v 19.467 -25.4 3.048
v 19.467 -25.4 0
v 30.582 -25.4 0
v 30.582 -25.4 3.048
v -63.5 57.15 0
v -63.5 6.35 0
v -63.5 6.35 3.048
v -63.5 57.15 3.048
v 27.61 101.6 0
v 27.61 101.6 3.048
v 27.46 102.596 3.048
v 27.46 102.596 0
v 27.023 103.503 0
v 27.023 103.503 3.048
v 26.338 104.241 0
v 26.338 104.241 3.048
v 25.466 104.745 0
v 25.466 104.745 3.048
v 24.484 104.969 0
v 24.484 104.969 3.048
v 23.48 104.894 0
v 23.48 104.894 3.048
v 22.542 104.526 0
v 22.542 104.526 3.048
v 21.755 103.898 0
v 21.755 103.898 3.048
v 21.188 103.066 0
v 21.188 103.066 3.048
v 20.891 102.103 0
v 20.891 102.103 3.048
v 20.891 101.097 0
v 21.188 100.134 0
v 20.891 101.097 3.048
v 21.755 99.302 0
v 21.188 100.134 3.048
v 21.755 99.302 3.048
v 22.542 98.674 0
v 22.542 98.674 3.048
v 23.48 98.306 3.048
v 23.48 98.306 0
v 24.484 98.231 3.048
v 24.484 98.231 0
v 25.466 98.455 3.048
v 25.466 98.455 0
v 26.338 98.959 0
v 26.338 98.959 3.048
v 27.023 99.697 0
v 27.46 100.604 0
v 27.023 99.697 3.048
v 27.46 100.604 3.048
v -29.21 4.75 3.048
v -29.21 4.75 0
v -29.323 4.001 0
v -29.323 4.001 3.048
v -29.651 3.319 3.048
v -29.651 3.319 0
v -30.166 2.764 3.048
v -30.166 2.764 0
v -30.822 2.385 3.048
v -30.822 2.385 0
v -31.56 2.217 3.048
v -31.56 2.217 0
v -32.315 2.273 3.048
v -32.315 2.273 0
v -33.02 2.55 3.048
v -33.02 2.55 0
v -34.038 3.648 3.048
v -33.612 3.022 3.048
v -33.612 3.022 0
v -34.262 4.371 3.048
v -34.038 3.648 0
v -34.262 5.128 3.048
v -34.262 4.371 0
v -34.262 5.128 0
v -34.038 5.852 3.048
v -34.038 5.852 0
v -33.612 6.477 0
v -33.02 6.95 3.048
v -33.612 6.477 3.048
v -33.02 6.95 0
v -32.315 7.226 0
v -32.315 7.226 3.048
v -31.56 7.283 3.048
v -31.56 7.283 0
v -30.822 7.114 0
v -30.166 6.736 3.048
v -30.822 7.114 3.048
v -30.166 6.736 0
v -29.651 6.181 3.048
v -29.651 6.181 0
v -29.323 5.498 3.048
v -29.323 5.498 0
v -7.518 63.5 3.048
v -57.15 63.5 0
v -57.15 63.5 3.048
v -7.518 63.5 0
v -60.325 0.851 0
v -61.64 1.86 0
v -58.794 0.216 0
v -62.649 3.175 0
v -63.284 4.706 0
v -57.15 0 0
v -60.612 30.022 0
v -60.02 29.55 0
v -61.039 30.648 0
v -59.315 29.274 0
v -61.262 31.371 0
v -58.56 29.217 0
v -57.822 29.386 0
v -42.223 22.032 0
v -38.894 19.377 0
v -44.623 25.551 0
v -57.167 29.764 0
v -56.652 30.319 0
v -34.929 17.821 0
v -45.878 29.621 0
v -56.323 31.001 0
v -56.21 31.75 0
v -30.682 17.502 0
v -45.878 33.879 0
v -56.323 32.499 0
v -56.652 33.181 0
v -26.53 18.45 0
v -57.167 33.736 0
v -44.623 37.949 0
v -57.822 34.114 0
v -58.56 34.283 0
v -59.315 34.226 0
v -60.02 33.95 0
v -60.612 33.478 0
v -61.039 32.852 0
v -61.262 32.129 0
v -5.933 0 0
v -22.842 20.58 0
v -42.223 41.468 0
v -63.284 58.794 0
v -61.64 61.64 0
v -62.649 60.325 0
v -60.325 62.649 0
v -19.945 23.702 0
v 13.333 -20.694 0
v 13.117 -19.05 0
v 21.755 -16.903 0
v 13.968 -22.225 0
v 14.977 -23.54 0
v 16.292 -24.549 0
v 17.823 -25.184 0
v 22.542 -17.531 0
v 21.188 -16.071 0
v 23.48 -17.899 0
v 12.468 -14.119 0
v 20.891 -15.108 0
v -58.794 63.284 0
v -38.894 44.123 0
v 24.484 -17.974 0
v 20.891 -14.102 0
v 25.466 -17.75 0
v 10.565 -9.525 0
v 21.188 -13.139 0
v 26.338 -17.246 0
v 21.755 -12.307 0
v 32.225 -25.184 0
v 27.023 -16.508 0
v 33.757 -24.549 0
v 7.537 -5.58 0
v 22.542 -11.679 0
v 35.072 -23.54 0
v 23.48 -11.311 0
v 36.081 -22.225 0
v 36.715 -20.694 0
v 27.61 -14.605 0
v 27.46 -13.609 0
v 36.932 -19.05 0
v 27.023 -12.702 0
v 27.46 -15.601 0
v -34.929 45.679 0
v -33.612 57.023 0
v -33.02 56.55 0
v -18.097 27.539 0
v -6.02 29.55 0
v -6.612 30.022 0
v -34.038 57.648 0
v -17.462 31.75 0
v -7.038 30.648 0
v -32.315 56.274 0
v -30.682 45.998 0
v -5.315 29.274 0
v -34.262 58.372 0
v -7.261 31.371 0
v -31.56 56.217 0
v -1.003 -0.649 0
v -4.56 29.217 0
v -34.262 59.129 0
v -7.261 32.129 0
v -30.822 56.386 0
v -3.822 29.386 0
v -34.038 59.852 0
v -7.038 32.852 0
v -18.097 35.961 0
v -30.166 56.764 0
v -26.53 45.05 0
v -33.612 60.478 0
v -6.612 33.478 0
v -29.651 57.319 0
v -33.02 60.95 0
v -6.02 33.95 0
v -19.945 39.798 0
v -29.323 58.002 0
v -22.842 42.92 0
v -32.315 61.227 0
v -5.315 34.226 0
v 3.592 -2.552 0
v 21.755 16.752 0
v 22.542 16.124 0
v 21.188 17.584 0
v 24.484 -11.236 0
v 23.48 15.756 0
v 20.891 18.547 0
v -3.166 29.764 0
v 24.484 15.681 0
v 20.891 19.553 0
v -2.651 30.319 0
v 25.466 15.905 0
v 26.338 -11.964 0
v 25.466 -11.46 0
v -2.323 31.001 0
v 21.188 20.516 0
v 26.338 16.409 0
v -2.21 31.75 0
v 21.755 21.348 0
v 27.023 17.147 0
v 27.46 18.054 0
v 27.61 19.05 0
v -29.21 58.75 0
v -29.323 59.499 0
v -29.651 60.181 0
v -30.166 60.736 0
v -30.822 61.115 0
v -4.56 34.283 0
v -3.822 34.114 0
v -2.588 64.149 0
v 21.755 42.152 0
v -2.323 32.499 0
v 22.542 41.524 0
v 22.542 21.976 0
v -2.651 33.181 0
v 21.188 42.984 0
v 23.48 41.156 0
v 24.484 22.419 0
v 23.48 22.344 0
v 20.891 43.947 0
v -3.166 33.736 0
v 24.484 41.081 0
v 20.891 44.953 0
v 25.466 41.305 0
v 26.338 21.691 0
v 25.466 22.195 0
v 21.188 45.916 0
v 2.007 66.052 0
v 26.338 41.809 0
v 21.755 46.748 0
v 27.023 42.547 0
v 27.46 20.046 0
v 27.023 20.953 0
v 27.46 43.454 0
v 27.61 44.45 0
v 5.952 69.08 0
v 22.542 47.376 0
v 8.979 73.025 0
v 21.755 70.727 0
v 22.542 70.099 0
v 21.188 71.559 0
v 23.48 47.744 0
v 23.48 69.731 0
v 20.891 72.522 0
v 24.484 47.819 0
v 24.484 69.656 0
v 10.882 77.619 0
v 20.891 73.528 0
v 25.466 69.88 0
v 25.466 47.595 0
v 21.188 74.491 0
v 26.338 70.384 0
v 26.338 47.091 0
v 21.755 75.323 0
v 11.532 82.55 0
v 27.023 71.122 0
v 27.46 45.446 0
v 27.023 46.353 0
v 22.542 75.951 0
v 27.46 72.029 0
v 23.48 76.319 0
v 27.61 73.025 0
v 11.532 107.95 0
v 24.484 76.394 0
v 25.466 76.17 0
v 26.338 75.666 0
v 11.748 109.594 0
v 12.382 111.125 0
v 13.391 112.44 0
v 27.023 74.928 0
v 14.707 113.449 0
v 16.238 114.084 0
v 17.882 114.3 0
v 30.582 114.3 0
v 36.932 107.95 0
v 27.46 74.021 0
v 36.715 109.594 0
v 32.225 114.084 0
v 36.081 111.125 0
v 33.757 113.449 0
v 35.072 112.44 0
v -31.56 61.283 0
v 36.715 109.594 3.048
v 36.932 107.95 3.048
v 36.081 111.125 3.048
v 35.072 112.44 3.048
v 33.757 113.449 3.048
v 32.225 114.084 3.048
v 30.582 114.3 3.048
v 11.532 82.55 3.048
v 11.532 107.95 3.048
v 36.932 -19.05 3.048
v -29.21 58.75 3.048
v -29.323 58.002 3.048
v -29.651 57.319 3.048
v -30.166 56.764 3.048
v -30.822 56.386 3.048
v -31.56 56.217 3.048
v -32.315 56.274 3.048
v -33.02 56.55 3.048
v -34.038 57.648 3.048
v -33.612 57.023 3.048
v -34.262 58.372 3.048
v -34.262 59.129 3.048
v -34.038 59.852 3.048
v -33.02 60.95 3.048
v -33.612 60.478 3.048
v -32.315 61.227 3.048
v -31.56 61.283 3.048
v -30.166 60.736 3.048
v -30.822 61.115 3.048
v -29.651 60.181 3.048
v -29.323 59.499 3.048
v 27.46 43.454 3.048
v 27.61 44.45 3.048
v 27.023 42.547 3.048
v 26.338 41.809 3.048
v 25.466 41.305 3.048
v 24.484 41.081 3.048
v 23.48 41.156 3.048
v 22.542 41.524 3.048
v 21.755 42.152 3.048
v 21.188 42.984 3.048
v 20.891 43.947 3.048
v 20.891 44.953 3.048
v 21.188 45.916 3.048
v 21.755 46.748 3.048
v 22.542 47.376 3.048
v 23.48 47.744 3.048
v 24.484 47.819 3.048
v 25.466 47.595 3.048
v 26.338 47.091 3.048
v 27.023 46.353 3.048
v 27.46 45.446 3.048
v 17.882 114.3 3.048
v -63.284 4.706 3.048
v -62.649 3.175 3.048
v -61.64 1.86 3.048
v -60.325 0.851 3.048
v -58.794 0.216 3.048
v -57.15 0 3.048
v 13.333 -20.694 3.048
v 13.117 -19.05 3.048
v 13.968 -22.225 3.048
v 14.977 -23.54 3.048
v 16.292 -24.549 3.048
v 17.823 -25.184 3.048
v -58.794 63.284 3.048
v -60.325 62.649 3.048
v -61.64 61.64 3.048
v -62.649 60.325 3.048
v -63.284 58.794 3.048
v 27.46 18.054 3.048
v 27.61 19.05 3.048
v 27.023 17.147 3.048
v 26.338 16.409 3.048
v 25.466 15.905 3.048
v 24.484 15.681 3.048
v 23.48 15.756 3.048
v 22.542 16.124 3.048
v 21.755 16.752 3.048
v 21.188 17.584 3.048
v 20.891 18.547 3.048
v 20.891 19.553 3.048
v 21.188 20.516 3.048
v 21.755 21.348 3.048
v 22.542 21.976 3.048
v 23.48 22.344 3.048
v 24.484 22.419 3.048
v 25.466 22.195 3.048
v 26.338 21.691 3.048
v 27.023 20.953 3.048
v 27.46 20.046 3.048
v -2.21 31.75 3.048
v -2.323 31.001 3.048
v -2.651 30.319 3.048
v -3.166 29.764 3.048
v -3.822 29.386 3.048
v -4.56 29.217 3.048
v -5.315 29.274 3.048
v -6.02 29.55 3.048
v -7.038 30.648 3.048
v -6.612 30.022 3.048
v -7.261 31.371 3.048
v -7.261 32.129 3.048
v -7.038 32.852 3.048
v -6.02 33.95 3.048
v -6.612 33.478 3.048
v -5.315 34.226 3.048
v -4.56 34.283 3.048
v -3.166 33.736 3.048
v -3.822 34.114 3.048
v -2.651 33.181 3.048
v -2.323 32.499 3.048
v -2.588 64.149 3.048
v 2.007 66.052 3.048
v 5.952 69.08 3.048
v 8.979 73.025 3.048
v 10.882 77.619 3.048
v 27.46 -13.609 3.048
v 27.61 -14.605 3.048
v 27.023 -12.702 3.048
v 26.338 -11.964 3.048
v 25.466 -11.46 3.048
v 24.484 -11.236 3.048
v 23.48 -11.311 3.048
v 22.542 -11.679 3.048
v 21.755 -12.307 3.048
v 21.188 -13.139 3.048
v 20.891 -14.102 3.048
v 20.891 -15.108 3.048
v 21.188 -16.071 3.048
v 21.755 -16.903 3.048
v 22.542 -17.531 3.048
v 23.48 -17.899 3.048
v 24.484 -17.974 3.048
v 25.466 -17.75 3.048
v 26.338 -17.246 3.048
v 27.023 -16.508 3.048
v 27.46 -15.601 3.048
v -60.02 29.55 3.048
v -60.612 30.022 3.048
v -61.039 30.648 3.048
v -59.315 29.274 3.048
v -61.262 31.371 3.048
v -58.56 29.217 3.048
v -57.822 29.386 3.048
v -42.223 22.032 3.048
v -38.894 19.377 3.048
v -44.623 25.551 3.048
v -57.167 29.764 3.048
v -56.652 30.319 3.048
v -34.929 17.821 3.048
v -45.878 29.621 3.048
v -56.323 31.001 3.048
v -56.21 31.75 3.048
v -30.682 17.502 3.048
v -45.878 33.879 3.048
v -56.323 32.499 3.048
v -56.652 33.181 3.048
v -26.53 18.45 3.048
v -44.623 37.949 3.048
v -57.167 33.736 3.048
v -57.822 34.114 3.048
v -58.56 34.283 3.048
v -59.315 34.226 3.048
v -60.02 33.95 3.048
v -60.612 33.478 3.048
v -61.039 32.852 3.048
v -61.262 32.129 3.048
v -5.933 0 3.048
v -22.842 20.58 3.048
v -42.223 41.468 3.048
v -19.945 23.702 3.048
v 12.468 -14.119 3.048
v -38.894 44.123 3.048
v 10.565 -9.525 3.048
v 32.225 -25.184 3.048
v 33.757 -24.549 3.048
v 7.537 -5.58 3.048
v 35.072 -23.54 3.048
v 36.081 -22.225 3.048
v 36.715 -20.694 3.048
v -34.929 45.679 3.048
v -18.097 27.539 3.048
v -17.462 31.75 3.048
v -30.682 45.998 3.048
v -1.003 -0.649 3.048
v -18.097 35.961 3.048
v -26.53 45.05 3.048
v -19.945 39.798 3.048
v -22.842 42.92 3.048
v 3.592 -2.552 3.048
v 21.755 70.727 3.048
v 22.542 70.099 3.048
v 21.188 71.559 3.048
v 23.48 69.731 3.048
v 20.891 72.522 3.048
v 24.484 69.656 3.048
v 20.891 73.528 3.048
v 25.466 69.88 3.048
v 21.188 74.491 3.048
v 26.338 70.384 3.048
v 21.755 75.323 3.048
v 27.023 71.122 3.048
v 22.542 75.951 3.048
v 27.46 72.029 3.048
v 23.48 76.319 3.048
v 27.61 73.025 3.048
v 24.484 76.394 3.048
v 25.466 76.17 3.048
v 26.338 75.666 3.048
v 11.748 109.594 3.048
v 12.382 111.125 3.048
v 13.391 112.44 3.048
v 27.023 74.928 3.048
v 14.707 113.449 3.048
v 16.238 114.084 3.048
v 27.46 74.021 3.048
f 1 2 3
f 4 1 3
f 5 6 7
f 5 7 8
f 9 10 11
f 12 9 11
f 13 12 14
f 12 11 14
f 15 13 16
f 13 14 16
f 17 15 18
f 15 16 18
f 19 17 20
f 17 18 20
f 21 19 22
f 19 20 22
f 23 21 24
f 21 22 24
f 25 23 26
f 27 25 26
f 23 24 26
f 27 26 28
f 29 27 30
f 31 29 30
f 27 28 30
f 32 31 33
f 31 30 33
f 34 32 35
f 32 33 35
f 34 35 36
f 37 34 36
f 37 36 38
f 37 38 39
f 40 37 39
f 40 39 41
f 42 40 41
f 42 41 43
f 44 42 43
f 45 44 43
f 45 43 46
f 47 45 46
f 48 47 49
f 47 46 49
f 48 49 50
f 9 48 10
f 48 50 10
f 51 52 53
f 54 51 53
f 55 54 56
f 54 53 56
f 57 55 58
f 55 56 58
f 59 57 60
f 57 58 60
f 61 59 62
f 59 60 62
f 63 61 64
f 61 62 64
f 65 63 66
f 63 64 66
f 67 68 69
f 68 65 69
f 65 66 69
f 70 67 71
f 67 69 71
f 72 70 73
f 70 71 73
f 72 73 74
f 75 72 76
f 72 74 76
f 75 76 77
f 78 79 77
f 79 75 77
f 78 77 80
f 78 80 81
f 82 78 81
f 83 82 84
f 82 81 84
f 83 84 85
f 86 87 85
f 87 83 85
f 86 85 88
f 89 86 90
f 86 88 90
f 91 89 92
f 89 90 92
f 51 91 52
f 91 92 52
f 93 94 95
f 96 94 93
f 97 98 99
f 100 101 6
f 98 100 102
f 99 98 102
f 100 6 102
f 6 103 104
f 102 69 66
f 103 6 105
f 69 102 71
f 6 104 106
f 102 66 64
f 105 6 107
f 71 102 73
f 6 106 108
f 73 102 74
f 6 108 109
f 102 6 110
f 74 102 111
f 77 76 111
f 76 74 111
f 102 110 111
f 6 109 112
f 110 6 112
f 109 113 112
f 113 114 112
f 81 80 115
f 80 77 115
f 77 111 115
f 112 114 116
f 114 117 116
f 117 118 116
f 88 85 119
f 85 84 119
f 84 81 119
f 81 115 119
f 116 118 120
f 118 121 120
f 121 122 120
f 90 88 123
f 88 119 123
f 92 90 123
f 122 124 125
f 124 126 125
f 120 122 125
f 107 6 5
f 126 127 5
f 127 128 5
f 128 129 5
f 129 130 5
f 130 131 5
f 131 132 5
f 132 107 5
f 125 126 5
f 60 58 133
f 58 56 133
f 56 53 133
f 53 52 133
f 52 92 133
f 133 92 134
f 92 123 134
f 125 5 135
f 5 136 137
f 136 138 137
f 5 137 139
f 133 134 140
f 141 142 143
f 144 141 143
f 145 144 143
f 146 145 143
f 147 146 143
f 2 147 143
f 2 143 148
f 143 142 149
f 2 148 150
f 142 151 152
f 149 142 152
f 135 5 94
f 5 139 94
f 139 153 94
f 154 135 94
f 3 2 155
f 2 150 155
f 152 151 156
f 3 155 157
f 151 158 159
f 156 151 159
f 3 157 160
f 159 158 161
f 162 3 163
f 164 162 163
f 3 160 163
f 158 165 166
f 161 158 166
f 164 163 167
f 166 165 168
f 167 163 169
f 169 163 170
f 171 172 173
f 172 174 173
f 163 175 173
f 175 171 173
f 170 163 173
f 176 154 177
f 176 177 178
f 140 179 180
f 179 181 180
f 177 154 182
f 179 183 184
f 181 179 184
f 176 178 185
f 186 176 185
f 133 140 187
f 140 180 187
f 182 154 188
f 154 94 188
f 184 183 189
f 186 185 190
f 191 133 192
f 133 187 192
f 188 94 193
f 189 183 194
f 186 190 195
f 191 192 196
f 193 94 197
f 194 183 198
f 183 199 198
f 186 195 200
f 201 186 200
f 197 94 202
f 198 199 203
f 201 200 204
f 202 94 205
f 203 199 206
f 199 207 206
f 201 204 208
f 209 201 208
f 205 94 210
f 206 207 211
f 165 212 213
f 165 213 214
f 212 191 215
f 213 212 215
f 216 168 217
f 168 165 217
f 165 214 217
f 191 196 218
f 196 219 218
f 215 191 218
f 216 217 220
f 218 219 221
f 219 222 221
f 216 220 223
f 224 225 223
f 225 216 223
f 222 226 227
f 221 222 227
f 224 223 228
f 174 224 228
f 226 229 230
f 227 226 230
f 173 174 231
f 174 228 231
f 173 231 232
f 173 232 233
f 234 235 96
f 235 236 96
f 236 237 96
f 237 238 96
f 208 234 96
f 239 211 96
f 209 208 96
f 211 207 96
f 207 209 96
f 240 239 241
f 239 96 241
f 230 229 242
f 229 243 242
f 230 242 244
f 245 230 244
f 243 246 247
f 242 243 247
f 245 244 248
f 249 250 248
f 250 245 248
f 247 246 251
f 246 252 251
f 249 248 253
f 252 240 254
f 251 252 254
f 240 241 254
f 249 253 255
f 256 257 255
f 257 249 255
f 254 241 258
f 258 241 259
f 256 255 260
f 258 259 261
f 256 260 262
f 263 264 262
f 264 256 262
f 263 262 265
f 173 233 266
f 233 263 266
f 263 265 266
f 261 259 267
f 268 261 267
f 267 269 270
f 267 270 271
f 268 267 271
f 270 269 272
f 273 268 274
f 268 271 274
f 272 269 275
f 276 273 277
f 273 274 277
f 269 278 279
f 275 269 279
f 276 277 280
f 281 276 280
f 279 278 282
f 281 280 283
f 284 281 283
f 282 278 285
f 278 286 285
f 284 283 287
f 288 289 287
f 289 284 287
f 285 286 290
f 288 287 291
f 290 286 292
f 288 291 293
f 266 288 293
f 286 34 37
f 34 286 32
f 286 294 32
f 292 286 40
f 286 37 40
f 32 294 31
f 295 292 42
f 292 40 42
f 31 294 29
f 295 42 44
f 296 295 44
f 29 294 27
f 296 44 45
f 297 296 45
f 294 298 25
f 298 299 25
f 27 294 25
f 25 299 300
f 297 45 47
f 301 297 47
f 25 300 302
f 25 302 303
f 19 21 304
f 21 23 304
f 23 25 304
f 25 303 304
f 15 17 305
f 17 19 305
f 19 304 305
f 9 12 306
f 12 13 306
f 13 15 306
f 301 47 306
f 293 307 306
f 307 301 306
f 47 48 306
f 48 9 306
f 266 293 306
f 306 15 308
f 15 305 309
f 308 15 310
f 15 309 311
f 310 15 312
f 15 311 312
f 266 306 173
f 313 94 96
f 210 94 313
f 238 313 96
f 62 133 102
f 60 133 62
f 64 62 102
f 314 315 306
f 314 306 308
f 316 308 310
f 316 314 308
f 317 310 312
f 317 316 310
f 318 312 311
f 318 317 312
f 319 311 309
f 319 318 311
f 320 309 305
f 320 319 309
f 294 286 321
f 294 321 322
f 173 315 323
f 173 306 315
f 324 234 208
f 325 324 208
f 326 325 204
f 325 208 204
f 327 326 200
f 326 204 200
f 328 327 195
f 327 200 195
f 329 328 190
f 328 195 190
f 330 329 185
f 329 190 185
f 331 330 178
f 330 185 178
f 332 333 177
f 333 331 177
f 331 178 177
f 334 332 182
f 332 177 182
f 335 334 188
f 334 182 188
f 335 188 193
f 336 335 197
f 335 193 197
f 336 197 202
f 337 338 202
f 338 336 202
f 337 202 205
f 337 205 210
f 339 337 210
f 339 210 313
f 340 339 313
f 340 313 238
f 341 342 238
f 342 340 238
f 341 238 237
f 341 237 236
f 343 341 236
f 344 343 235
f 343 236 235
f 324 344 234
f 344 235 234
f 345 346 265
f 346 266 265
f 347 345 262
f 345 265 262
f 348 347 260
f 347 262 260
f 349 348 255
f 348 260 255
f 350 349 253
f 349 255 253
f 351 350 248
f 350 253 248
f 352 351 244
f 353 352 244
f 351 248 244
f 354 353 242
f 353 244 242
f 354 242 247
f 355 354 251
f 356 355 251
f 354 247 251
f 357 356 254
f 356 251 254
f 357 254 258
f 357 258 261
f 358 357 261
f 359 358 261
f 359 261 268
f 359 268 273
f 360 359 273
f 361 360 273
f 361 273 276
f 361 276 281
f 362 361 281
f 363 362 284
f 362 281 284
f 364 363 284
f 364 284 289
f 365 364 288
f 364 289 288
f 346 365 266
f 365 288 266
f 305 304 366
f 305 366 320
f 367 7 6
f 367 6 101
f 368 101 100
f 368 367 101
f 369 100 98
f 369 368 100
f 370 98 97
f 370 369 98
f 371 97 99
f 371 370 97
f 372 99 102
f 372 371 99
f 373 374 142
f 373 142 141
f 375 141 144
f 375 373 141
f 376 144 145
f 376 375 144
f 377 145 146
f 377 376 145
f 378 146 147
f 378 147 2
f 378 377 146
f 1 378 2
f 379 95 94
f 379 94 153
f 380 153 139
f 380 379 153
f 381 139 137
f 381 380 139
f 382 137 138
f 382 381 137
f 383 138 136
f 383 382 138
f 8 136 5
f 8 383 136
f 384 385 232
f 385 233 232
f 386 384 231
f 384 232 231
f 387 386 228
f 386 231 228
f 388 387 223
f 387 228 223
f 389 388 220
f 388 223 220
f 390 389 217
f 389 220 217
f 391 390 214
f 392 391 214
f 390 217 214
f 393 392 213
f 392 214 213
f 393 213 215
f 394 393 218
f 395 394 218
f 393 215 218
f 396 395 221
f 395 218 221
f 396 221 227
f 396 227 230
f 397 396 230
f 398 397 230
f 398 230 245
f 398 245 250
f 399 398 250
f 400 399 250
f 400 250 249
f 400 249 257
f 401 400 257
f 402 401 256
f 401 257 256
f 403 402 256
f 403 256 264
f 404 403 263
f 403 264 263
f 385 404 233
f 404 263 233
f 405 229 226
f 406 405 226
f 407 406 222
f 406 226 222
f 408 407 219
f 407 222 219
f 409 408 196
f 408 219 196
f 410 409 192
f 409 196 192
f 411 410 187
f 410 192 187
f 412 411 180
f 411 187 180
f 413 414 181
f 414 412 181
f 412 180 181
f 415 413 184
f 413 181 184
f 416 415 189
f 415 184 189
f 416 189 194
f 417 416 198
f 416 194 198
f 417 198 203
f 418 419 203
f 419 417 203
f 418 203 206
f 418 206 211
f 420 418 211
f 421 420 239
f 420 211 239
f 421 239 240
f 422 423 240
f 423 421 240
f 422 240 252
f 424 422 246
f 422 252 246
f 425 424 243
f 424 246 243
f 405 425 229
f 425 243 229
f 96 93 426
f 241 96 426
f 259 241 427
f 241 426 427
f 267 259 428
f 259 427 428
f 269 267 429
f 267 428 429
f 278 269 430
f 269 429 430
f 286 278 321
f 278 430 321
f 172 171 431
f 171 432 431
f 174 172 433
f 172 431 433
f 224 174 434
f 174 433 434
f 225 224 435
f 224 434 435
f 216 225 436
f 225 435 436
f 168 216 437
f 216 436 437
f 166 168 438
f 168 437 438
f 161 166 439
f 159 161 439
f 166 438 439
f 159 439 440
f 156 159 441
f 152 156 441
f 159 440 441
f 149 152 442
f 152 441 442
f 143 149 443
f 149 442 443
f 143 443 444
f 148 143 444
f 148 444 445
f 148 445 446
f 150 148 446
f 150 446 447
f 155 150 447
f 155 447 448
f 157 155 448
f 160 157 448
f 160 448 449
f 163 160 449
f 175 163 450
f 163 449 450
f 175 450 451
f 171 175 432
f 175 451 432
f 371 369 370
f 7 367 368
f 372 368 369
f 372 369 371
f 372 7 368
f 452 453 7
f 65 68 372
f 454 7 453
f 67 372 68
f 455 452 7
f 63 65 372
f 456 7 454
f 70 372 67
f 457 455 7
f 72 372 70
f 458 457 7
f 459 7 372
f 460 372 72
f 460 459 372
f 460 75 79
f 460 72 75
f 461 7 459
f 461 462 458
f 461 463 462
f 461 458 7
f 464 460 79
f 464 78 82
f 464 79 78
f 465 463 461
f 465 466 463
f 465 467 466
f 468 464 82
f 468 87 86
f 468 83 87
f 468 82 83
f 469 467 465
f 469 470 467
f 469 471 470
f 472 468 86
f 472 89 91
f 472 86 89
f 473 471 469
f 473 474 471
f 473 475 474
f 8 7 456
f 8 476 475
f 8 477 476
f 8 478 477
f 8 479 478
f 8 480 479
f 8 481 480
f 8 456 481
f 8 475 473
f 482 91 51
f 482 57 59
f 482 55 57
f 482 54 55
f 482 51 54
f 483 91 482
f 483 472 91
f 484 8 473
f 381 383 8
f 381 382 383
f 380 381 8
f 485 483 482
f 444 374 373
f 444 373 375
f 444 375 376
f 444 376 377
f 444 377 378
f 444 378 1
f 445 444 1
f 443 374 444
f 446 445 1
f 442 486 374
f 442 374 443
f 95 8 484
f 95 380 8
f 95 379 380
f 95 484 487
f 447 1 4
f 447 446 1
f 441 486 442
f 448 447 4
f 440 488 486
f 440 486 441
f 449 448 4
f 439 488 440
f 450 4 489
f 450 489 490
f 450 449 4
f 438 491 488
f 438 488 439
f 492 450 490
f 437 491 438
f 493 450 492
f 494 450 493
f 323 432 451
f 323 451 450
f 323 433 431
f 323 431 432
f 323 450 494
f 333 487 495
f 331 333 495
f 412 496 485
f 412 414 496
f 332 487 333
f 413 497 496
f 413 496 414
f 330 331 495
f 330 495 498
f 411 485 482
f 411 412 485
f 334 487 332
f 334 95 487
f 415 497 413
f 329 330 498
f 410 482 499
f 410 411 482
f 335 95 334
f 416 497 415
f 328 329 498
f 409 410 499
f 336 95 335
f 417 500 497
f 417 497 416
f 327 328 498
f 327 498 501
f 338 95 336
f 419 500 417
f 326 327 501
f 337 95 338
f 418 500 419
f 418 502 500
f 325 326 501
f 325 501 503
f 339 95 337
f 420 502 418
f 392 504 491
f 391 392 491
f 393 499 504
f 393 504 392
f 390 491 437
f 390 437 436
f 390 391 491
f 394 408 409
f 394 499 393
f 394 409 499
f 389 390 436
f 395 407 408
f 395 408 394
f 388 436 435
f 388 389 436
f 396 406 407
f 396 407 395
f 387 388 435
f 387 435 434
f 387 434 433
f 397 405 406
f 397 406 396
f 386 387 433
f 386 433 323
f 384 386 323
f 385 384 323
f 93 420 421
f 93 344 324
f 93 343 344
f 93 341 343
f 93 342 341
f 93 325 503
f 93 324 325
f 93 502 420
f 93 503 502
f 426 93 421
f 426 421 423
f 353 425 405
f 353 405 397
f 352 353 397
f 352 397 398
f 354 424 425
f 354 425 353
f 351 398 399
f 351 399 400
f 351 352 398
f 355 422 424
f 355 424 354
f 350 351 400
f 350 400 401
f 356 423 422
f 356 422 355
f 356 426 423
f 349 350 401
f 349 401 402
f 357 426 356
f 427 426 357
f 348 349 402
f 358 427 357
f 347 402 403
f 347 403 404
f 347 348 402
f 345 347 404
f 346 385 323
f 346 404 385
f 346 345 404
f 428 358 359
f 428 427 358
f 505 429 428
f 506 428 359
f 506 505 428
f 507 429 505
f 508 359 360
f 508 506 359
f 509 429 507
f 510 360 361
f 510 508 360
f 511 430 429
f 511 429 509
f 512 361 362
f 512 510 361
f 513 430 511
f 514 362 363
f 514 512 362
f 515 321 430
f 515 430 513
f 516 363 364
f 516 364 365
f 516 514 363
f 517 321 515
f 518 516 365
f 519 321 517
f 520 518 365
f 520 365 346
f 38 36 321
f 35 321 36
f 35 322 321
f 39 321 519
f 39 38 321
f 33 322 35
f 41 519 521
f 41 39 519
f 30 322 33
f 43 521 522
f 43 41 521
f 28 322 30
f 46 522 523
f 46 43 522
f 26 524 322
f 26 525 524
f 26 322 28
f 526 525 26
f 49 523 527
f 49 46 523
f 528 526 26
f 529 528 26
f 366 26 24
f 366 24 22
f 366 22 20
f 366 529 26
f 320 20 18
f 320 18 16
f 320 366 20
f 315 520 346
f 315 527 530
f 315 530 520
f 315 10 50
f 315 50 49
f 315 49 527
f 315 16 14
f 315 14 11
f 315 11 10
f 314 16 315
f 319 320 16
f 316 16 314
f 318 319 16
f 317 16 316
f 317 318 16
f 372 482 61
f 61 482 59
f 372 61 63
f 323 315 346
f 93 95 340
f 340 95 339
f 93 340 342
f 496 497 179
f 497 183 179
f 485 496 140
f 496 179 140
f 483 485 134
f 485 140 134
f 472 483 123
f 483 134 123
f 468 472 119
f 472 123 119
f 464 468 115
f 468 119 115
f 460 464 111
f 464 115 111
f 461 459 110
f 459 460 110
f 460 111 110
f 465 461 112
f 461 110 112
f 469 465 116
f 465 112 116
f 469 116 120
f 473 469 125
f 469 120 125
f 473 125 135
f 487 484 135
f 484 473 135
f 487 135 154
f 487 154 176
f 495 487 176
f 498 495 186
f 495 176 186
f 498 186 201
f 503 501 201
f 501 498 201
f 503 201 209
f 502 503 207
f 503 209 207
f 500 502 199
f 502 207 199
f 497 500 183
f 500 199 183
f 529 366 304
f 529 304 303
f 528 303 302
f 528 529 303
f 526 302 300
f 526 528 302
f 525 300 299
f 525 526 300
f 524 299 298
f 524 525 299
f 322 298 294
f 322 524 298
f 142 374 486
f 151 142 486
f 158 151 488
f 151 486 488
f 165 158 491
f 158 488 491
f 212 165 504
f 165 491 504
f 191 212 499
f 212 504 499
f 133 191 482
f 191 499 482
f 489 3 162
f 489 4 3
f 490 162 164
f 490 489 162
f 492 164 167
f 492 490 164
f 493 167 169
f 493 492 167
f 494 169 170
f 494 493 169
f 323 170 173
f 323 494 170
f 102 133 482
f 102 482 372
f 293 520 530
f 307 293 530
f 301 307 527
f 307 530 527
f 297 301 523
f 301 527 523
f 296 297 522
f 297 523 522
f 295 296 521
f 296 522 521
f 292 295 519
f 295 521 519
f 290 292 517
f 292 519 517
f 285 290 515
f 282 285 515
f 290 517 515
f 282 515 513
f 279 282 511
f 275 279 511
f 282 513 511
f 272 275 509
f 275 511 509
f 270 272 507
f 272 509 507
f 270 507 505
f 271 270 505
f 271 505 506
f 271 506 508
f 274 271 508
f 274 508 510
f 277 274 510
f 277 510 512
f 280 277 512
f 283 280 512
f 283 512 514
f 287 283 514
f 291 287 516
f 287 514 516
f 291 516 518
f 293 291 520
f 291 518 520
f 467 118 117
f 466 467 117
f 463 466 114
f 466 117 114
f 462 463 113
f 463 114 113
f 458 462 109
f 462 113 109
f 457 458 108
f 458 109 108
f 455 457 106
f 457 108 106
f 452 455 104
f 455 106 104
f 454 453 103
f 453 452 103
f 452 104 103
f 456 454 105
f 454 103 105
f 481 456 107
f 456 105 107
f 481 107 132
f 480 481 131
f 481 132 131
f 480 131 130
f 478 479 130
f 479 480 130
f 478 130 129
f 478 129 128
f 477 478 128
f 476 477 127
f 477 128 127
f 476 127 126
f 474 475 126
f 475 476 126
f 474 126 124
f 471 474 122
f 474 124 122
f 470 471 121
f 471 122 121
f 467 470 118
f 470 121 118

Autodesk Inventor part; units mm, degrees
ref_plane "YZ Plane" through (0, 0, 0) normal (1, 0, 0) x (0, 1, 0)
ref_plane "XZ Plane" through (0, 0, 0) normal (0, 1, 0) x (-1, 0, 0)
ref_plane "XY Plane" through (0, 0, 0) normal (0, 0, 1) x (1, 0, 0)
sketch "Sketch1" plane through (0, 0, 0) normal (0, 0, 1) x (1, 0, 0)
  line L0 (0, 0) -> (-63.5, 0)
  line L1 (-63.5, 0) -> (-63.5, 63.5)
  line L2 (-63.5, 63.5) -> (0, 63.5)
  circle A0 centre (-58.7502, 31.75) radius 2.54
  circle A1 centre (-31.75, 58.7502) radius 2.54
  circle A2 centre (-4.7498, 31.75) radius 2.54
  circle A3 centre (-31.75, 4.7498) radius 2.54
  line L3 (36.9316, 63.5) -> (36.9316, 0)
  line L4 (13.1168, 0) -> (0, 0)
  circle A4 centre (-31.75, 31.75) radius 14.2875
  line L5 (24.2316, 63.5) -> (24.2316, 44.45)
  line L6 (24.2316, 44.45) -> (24.2316, 19.05)
  circle A5 centre (24.2316, 44.45) radius 3.3782
  circle A6 centre (24.2316, 19.05) radius 3.3782
  line L7 (20.8534, 44.45) -> (20.8534, 19.05)
  line L8 (27.6098, 19.05) -> (27.6098, 44.45)
  line L9 (11.5316, 63.5) -> (11.5316, 114.3)
  line L10 (13.1168, 0) -> (13.1168, -25.4)
  line L11 (13.1168, -25.4) -> (36.9316, -25.4)
  line L12 (36.9316, -25.4) -> (36.9316, 0)
  line L13 (11.5316, 114.3) -> (36.9316, 114.3)
  line L14 (36.9316, 114.3) -> (36.9316, 63.5)
  line L15 (0, 63.5) -> (11.5316, 63.5)
  dimension "d0" = 63.5
  dimension "d1" = 63.5
  dimension "d6" = 5.08
  dimension "d7" = 5.08
  dimension "d8" = 5.08
  dimension "d9" = 5.08
  dimension "d11" = 36.9316
  dimension "d12" = 28.575
  dimension "d13" = 12.7
  dimension "d15" = 25.4
  dimension "d16" = 6.7564
  dimension "d17" = 6.7564
  dimension "d23" = 50.8
  dimension "d24" = 25.4
extrude "Plate2" add sketch "Sketch1" along normal blind 3.048 contours L0 L1 L2 L15 L9 L13 L14 L3 L12 L11 L10 L4 | L8 A6 L6 A5 | A5 L6 A6 L7
sketch "Sketch4" plane through (0, 0, 3.048) normal (0, 0, 1) x (1, 0, 0)
  circle A0 centre (24.2316, 19.05) radius 3.3782 projected
  circle A1 centre (24.2316, 44.45) radius 3.3782 projected
  line L0 (-63.5, 63.5) -> (11.5316, 63.5) projected
  line L1 (24.2316, 44.45) -> (24.2316, 101.6)
  circle A2 centre (24.2316, 101.6) radius 3.3782
  circle A3 centre (24.2316, 73.025) radius 3.3782
  line L2 (24.2316, 19.05) -> (24.2316, -14.605)
  circle A4 centre (24.2316, -14.605) radius 3.3782
  point P0 (0, 0)
  point P1 (20.8534, 44.45)
  point P2 (20.8534, 19.05)
  point P3 (27.6098, 19.05)
  point P4 (27.6098, 44.45)
  dimension "d25" = 57.15
  dimension "d26" = 6.7564
  dimension "d27" = 6.7564
  dimension "d28" = 33.655
  dimension "d29" = 6.7564
extrude "Cut1" cut sketch "Sketch4" against normal blind 3.048
fillet "Corner Round1" radius 19.05 2 edges at (11.5316, 63.5, 1.524) (13.1168, 0, 1.524)
fillet "Corner Round2" radius 6.35 6 edges at (-63.5, 63.5, 1.524) (-63.5, 0, 1.524) (13.1168, -25.4, 1.524) (36.9316, -25.4, 1.524) (36.9316, 114.3, 1.524) (11.5316, 114.3, 1.524)
equation "\"d19\" = Thickness"
equation "\"BendRadius\" = Thickness"
equation "\"BendReliefWidth\" = Thickness"
equation "\"BendReliefDepth\" = 0.5 * Thickness"
equation "\"CornerReliefSize\" = 4 * Thickness"
equation "\"MinimumRemnant\" = 2 * Thickness"
equation "\"TransitionRadius\" = BendRadius"
equation "\"JacobiRadiusSize\" = BendRadius"
equation "\"GapSize\" = Thickness"
equation "\"d10\" = BendRadius"
equation "\"d18\" = BendRadius"
equation "\"Thickness\" = 3.048"
properties part number "M - p80 mount plate" material "Aluminum 6061"
